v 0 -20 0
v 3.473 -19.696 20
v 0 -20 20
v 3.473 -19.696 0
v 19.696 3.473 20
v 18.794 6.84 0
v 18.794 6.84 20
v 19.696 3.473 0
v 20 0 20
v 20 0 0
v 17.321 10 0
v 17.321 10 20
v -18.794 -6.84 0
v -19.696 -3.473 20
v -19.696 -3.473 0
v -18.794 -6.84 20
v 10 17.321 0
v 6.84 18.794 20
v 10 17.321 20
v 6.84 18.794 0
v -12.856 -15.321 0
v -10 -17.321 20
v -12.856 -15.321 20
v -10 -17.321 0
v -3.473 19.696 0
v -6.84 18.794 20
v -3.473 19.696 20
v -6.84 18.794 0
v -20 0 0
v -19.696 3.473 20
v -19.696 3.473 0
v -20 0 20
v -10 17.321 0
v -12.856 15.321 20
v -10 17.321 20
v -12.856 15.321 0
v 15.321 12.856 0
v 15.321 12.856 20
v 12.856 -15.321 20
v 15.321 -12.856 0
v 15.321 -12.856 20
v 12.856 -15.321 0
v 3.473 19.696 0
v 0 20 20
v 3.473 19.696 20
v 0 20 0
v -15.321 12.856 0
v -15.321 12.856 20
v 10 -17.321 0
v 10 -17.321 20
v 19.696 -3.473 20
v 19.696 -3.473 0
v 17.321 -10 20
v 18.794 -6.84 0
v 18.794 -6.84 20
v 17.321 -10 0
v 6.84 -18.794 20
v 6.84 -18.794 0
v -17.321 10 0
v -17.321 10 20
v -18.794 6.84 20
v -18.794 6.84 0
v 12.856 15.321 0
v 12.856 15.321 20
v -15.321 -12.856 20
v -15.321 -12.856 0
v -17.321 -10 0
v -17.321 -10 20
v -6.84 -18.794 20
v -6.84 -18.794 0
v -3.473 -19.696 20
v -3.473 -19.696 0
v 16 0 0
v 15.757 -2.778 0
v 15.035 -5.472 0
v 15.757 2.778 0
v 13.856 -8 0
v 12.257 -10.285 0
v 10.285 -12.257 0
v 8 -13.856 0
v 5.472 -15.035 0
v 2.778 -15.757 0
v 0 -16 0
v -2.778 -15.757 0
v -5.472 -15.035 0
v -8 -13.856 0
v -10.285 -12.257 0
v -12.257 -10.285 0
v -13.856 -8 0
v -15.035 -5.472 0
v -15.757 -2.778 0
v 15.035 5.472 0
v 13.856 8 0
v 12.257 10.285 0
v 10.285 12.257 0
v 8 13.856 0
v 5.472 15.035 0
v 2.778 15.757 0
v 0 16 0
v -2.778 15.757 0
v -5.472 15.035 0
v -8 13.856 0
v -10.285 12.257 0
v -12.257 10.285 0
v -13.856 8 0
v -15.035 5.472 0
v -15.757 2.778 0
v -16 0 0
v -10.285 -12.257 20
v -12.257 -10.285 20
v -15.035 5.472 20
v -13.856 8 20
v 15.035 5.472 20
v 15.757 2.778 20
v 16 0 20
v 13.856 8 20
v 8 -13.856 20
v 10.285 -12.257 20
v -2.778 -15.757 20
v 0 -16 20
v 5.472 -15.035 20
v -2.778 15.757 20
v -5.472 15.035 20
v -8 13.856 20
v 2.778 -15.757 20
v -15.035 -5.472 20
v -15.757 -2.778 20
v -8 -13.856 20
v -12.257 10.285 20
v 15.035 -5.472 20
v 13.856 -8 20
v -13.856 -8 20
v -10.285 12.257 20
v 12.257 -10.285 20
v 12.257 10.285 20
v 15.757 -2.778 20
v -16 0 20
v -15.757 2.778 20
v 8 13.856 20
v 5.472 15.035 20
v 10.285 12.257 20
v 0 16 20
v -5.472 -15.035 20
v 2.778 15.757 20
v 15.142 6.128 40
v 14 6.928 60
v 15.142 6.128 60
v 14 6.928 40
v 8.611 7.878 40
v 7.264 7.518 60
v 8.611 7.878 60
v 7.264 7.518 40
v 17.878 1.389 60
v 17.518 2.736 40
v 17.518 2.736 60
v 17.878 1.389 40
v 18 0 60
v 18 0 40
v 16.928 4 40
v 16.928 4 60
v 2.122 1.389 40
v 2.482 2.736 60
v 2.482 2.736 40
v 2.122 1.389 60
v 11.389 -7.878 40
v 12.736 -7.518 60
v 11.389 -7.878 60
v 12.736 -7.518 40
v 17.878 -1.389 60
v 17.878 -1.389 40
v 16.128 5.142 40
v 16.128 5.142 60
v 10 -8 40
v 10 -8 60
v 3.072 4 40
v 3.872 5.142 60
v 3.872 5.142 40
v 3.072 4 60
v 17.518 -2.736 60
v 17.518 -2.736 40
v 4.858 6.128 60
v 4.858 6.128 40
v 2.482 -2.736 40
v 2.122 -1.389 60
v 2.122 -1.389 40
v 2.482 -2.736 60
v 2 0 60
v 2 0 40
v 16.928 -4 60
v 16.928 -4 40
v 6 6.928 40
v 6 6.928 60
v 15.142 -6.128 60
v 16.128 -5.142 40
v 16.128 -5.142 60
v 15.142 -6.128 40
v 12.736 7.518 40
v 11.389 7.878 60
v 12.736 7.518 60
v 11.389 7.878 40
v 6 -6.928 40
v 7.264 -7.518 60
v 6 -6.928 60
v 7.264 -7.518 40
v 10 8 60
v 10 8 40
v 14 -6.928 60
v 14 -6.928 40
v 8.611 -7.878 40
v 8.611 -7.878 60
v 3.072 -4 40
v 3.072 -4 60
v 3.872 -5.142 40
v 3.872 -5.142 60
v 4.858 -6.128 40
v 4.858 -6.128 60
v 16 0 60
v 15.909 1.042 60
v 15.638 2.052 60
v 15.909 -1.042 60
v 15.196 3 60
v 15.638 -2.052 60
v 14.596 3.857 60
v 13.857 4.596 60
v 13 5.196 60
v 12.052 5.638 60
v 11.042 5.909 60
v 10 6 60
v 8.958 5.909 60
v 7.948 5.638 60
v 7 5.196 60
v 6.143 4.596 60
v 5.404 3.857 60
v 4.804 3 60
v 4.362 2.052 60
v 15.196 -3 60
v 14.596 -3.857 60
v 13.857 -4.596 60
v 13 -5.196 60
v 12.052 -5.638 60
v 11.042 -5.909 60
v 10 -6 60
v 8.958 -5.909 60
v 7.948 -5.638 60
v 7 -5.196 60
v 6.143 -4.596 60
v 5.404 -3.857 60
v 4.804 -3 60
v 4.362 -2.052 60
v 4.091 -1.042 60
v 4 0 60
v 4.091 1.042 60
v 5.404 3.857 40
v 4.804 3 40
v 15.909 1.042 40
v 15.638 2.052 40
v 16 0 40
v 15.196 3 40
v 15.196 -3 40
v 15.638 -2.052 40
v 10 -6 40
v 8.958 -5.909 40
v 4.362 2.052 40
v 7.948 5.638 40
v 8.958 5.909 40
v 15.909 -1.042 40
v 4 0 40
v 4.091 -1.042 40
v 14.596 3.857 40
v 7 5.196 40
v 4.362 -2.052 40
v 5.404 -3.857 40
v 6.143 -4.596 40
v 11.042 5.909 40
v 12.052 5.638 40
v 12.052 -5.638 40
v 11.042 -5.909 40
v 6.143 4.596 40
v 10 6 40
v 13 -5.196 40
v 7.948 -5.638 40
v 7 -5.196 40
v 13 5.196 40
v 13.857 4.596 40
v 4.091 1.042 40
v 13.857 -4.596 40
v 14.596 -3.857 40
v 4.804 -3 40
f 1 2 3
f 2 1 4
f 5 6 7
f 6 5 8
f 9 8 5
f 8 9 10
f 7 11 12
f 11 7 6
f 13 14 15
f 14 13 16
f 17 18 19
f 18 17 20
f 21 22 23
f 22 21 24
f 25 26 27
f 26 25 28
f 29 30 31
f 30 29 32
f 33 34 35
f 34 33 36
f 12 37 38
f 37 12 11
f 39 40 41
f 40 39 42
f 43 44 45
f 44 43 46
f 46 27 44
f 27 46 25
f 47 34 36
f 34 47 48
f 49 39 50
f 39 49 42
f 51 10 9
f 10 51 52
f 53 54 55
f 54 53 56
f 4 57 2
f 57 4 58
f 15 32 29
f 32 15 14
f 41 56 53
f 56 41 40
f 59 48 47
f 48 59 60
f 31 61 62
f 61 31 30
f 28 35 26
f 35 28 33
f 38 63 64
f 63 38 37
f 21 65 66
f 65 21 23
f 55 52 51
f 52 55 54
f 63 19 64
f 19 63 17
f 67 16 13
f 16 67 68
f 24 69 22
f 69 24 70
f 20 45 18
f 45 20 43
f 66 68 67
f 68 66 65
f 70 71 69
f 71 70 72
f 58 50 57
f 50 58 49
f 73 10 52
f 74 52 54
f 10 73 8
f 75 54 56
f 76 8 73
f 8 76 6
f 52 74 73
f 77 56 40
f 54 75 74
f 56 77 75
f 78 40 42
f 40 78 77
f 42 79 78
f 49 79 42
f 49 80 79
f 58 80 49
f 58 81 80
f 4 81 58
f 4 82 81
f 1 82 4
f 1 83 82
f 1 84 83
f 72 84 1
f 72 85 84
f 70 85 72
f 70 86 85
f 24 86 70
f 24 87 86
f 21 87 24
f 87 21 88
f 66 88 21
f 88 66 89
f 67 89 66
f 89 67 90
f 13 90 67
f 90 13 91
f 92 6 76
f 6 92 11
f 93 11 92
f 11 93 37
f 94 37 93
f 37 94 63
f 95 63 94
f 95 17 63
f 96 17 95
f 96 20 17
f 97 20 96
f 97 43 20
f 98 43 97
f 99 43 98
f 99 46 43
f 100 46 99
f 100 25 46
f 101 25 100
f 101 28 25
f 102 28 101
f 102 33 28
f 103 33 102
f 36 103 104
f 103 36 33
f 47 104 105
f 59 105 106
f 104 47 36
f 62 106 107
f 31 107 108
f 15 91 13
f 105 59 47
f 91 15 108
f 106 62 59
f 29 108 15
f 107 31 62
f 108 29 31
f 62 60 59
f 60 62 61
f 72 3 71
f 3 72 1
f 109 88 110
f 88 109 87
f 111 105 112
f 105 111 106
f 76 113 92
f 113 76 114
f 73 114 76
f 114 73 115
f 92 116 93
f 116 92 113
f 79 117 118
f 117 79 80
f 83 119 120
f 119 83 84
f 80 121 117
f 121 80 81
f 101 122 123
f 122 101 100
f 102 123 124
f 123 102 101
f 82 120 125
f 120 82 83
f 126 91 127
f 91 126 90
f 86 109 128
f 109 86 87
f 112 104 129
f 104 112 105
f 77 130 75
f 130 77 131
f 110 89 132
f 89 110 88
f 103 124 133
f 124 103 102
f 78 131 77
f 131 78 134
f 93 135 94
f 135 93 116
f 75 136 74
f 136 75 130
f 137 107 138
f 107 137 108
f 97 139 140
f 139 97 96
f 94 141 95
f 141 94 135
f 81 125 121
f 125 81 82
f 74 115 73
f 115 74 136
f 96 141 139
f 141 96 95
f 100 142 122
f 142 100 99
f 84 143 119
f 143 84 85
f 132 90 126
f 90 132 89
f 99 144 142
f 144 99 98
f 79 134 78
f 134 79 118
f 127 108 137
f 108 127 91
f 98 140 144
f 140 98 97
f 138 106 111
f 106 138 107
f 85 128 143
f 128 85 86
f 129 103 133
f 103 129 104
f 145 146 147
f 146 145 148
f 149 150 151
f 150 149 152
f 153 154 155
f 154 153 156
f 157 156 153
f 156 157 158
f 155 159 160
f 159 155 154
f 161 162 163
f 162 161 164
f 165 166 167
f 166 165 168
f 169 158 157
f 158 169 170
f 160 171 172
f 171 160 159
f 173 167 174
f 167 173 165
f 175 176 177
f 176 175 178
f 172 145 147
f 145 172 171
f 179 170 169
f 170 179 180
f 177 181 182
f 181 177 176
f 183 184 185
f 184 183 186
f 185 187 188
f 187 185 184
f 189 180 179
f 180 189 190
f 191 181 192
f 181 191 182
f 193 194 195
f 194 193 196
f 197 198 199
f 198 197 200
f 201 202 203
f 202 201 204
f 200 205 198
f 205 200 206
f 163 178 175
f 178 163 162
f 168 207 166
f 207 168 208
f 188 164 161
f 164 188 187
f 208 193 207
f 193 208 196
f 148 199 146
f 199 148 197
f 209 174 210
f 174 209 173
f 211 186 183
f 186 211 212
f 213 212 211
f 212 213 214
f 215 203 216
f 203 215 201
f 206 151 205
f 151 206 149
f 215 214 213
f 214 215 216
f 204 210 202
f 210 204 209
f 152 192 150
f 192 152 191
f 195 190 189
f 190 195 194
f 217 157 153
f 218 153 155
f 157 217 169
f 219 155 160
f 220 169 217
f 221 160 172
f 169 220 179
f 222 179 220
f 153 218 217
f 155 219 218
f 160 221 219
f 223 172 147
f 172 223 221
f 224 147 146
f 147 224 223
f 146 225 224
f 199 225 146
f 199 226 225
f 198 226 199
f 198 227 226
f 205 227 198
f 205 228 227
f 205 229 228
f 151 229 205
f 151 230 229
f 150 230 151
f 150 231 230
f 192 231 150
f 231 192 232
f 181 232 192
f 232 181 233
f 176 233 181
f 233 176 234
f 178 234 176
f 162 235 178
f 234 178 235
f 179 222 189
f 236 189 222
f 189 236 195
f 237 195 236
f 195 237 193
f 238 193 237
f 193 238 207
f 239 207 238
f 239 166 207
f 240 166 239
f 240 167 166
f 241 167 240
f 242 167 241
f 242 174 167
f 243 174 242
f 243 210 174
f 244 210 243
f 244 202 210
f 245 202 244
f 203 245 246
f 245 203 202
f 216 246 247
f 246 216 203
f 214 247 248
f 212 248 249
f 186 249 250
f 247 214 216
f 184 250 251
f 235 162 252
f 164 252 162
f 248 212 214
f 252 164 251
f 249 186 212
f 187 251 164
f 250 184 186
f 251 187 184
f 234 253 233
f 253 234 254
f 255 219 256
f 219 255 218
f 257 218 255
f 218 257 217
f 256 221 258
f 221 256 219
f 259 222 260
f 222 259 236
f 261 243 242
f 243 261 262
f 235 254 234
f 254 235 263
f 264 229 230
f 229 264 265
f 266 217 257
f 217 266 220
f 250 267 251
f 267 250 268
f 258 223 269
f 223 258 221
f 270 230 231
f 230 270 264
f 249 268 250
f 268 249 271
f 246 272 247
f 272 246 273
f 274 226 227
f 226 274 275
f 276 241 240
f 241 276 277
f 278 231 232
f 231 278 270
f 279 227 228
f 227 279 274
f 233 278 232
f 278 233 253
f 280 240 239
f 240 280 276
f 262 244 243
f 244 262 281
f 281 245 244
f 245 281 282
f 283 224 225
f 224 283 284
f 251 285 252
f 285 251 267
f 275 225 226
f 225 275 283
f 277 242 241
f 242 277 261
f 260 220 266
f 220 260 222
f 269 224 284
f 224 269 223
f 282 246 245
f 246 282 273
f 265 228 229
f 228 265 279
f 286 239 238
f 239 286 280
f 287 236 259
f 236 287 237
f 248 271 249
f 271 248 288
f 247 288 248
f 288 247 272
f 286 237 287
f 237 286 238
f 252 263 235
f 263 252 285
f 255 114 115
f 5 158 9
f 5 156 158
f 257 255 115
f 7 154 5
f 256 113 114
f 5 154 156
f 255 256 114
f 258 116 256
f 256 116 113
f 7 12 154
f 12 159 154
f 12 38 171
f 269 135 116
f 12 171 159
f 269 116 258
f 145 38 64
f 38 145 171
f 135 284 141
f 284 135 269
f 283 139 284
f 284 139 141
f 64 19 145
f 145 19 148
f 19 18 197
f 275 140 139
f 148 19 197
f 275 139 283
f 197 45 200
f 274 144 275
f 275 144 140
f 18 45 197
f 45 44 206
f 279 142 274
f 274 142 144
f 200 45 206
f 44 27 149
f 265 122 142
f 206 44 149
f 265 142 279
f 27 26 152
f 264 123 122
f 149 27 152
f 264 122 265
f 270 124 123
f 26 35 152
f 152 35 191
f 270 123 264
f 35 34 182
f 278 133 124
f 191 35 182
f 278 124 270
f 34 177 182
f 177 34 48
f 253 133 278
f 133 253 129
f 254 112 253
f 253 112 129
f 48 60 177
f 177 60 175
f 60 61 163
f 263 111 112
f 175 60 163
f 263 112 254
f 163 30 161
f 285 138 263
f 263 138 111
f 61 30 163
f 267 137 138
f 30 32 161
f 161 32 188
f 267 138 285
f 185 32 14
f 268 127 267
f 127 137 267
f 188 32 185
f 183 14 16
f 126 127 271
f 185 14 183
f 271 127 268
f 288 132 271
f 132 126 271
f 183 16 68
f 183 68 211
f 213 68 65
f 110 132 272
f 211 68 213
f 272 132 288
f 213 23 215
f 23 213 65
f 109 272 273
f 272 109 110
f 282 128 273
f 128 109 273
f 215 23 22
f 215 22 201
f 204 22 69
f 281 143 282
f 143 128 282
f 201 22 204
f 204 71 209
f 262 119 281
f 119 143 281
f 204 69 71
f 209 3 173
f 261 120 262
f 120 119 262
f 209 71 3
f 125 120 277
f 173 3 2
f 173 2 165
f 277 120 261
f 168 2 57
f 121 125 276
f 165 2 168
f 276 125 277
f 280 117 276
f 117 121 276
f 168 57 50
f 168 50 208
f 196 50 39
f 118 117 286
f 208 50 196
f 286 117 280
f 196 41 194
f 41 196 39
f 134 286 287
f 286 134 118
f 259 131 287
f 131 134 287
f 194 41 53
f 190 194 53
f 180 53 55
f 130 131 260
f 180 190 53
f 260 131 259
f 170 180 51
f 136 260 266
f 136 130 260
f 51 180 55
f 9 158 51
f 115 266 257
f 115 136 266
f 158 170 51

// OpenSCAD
// eccentric pipe reducer
// by MisterC

// input parameters

/* lower pipe */
// lower pipe inner diameter
lower_diameter = 32; // min/max:[1:100]
// lower pipe height
lower_height = 20; // min/max:[1:100]
// lower pipe wall
lower_wall = 4; // min/max:[0.5:0.5:10]

/* transition piece */
// gap between lower and upper pipes
trans_height = 20; // min/max:[5:50]

// offset of reducer:
trans_angle = 0; // min/max:[0:360]
// angle (0=+X,90=+Y etc)
// ratio to cl
trans_ratio = 100; // min/max:[0:100]
// 0 ratio is concentric
// 100 ratio is wall parallel

// should inside walls run through?
in_parallel = true; // [true,false]
// true if inner wall would be parallel, false if outer

// resolution of reducer
segments = 36; //[36:Low, 90:Medium, 180:High]


/* upper pipe */
// upper pipe inner diameter
upper_diameter = 12; // min/max:[1:100]
// upper pipe height
upper_height = 20; // min/max:[1:100]
// upper pipe wall
upper_wall = 2; // min/max:[0.5:0.5:10]


// calculated values
/* [Hidden]*/
ang = 360 / segments; // degrees per segment
$fn = segments; // make the pipes as accurate as the transition
fudge = 1; // fudge for cuts

// heights
lower_btm = 0;
lower_top = lower_btm + lower_height;
upper_btm = lower_top + trans_height;
upper_top = upper_btm + upper_height;

// pipe radii
lower_in = lower_diameter / 2;
lower_out = lower_in + lower_wall;
upper_in = upper_diameter / 2;
upper_out = upper_in + upper_wall;

// if parallel_check is inners (in_parallel is true) then centre_offset is inners else outers
// using SCAD's conditional syntax
ctr_off = in_parallel
    ? (lower_in - upper_in)
    : (lower_out - upper_out);

// now work out where the upper pipe centre is
x_offset = cos(trans_angle) * ctr_off * trans_ratio / 100;
y_offset = sin(trans_angle) * ctr_off * trans_ratio / 100;


// modules and functions
// cos_fill & sin_fill create a list of x&y co-ordinates using a loop structure copied from Mathgrrl's snowflakerator sequence generators
function cos_fill(distance, switch)
    = [for(step=[0:segments])
        distance*cos(ang*step) + x_offset*switch];

function sin_fill(distance, switch)
    = [for(step=[0:segments])
        distance*sin(ang*step) + y_offset*switch];

// lots of co-ordinate calcs
lower_Ox=cos_fill(lower_out,0);
lower_Oy=sin_fill(lower_out,0);

upper_Ox=cos_fill(upper_out,1);
upper_Oy=sin_fill(upper_out,1);

lower_Ix=cos_fill(lower_in,0);
lower_Iy=sin_fill(lower_in,0);

upper_Ix=cos_fill(upper_in,1);
upper_Iy=sin_fill(upper_in,1);

// and now to business
color ("green")
difference()    // lower pipe
{
    translate([0,0,lower_btm])
        cylinder(r=lower_out, h=lower_height);
    translate([0,0,lower_btm-fudge])
        cylinder(r=lower_in, h=lower_height+(2*fudge));
}
color ("red")
difference()    // upper pipe
{
    translate([x_offset,y_offset,upper_btm])
        cylinder(r=upper_out, h=upper_height);
    translate([x_offset,y_offset,upper_btm-fudge])
        cylinder(r=upper_in, h=upper_height+(2*fudge));
}
// 'cubes' (really trapezoidal blocks) for reducer using polyhedron command as per OpenSCAD wiki example 1 by Bruno Bronosky
color ("blue")
for (step=[1:segments])
{
    polyhedron(points = [
        [lower_Ox[step-1],lower_Oy[step-1],lower_top],
        [lower_Ox[step],lower_Oy[step],lower_top],
        [lower_Ix[step],lower_Iy[step],lower_top],
        [lower_Ix[step-1],lower_Iy[step-1],lower_top],
        [upper_Ox[step-1],upper_Oy[step-1],upper_btm],
        [upper_Ox[step],upper_Oy[step],upper_btm],
        [upper_Ix[step],upper_Iy[step],upper_btm],
        [upper_Ix[step-1],upper_Iy[step-1],upper_btm]
        ], faces = [
        [0,1,2,3],[4,5,1,0],[7,6,5,4],
        [5,6,2,1],[6,7,3,2],[7,4,0,3]]);
}
